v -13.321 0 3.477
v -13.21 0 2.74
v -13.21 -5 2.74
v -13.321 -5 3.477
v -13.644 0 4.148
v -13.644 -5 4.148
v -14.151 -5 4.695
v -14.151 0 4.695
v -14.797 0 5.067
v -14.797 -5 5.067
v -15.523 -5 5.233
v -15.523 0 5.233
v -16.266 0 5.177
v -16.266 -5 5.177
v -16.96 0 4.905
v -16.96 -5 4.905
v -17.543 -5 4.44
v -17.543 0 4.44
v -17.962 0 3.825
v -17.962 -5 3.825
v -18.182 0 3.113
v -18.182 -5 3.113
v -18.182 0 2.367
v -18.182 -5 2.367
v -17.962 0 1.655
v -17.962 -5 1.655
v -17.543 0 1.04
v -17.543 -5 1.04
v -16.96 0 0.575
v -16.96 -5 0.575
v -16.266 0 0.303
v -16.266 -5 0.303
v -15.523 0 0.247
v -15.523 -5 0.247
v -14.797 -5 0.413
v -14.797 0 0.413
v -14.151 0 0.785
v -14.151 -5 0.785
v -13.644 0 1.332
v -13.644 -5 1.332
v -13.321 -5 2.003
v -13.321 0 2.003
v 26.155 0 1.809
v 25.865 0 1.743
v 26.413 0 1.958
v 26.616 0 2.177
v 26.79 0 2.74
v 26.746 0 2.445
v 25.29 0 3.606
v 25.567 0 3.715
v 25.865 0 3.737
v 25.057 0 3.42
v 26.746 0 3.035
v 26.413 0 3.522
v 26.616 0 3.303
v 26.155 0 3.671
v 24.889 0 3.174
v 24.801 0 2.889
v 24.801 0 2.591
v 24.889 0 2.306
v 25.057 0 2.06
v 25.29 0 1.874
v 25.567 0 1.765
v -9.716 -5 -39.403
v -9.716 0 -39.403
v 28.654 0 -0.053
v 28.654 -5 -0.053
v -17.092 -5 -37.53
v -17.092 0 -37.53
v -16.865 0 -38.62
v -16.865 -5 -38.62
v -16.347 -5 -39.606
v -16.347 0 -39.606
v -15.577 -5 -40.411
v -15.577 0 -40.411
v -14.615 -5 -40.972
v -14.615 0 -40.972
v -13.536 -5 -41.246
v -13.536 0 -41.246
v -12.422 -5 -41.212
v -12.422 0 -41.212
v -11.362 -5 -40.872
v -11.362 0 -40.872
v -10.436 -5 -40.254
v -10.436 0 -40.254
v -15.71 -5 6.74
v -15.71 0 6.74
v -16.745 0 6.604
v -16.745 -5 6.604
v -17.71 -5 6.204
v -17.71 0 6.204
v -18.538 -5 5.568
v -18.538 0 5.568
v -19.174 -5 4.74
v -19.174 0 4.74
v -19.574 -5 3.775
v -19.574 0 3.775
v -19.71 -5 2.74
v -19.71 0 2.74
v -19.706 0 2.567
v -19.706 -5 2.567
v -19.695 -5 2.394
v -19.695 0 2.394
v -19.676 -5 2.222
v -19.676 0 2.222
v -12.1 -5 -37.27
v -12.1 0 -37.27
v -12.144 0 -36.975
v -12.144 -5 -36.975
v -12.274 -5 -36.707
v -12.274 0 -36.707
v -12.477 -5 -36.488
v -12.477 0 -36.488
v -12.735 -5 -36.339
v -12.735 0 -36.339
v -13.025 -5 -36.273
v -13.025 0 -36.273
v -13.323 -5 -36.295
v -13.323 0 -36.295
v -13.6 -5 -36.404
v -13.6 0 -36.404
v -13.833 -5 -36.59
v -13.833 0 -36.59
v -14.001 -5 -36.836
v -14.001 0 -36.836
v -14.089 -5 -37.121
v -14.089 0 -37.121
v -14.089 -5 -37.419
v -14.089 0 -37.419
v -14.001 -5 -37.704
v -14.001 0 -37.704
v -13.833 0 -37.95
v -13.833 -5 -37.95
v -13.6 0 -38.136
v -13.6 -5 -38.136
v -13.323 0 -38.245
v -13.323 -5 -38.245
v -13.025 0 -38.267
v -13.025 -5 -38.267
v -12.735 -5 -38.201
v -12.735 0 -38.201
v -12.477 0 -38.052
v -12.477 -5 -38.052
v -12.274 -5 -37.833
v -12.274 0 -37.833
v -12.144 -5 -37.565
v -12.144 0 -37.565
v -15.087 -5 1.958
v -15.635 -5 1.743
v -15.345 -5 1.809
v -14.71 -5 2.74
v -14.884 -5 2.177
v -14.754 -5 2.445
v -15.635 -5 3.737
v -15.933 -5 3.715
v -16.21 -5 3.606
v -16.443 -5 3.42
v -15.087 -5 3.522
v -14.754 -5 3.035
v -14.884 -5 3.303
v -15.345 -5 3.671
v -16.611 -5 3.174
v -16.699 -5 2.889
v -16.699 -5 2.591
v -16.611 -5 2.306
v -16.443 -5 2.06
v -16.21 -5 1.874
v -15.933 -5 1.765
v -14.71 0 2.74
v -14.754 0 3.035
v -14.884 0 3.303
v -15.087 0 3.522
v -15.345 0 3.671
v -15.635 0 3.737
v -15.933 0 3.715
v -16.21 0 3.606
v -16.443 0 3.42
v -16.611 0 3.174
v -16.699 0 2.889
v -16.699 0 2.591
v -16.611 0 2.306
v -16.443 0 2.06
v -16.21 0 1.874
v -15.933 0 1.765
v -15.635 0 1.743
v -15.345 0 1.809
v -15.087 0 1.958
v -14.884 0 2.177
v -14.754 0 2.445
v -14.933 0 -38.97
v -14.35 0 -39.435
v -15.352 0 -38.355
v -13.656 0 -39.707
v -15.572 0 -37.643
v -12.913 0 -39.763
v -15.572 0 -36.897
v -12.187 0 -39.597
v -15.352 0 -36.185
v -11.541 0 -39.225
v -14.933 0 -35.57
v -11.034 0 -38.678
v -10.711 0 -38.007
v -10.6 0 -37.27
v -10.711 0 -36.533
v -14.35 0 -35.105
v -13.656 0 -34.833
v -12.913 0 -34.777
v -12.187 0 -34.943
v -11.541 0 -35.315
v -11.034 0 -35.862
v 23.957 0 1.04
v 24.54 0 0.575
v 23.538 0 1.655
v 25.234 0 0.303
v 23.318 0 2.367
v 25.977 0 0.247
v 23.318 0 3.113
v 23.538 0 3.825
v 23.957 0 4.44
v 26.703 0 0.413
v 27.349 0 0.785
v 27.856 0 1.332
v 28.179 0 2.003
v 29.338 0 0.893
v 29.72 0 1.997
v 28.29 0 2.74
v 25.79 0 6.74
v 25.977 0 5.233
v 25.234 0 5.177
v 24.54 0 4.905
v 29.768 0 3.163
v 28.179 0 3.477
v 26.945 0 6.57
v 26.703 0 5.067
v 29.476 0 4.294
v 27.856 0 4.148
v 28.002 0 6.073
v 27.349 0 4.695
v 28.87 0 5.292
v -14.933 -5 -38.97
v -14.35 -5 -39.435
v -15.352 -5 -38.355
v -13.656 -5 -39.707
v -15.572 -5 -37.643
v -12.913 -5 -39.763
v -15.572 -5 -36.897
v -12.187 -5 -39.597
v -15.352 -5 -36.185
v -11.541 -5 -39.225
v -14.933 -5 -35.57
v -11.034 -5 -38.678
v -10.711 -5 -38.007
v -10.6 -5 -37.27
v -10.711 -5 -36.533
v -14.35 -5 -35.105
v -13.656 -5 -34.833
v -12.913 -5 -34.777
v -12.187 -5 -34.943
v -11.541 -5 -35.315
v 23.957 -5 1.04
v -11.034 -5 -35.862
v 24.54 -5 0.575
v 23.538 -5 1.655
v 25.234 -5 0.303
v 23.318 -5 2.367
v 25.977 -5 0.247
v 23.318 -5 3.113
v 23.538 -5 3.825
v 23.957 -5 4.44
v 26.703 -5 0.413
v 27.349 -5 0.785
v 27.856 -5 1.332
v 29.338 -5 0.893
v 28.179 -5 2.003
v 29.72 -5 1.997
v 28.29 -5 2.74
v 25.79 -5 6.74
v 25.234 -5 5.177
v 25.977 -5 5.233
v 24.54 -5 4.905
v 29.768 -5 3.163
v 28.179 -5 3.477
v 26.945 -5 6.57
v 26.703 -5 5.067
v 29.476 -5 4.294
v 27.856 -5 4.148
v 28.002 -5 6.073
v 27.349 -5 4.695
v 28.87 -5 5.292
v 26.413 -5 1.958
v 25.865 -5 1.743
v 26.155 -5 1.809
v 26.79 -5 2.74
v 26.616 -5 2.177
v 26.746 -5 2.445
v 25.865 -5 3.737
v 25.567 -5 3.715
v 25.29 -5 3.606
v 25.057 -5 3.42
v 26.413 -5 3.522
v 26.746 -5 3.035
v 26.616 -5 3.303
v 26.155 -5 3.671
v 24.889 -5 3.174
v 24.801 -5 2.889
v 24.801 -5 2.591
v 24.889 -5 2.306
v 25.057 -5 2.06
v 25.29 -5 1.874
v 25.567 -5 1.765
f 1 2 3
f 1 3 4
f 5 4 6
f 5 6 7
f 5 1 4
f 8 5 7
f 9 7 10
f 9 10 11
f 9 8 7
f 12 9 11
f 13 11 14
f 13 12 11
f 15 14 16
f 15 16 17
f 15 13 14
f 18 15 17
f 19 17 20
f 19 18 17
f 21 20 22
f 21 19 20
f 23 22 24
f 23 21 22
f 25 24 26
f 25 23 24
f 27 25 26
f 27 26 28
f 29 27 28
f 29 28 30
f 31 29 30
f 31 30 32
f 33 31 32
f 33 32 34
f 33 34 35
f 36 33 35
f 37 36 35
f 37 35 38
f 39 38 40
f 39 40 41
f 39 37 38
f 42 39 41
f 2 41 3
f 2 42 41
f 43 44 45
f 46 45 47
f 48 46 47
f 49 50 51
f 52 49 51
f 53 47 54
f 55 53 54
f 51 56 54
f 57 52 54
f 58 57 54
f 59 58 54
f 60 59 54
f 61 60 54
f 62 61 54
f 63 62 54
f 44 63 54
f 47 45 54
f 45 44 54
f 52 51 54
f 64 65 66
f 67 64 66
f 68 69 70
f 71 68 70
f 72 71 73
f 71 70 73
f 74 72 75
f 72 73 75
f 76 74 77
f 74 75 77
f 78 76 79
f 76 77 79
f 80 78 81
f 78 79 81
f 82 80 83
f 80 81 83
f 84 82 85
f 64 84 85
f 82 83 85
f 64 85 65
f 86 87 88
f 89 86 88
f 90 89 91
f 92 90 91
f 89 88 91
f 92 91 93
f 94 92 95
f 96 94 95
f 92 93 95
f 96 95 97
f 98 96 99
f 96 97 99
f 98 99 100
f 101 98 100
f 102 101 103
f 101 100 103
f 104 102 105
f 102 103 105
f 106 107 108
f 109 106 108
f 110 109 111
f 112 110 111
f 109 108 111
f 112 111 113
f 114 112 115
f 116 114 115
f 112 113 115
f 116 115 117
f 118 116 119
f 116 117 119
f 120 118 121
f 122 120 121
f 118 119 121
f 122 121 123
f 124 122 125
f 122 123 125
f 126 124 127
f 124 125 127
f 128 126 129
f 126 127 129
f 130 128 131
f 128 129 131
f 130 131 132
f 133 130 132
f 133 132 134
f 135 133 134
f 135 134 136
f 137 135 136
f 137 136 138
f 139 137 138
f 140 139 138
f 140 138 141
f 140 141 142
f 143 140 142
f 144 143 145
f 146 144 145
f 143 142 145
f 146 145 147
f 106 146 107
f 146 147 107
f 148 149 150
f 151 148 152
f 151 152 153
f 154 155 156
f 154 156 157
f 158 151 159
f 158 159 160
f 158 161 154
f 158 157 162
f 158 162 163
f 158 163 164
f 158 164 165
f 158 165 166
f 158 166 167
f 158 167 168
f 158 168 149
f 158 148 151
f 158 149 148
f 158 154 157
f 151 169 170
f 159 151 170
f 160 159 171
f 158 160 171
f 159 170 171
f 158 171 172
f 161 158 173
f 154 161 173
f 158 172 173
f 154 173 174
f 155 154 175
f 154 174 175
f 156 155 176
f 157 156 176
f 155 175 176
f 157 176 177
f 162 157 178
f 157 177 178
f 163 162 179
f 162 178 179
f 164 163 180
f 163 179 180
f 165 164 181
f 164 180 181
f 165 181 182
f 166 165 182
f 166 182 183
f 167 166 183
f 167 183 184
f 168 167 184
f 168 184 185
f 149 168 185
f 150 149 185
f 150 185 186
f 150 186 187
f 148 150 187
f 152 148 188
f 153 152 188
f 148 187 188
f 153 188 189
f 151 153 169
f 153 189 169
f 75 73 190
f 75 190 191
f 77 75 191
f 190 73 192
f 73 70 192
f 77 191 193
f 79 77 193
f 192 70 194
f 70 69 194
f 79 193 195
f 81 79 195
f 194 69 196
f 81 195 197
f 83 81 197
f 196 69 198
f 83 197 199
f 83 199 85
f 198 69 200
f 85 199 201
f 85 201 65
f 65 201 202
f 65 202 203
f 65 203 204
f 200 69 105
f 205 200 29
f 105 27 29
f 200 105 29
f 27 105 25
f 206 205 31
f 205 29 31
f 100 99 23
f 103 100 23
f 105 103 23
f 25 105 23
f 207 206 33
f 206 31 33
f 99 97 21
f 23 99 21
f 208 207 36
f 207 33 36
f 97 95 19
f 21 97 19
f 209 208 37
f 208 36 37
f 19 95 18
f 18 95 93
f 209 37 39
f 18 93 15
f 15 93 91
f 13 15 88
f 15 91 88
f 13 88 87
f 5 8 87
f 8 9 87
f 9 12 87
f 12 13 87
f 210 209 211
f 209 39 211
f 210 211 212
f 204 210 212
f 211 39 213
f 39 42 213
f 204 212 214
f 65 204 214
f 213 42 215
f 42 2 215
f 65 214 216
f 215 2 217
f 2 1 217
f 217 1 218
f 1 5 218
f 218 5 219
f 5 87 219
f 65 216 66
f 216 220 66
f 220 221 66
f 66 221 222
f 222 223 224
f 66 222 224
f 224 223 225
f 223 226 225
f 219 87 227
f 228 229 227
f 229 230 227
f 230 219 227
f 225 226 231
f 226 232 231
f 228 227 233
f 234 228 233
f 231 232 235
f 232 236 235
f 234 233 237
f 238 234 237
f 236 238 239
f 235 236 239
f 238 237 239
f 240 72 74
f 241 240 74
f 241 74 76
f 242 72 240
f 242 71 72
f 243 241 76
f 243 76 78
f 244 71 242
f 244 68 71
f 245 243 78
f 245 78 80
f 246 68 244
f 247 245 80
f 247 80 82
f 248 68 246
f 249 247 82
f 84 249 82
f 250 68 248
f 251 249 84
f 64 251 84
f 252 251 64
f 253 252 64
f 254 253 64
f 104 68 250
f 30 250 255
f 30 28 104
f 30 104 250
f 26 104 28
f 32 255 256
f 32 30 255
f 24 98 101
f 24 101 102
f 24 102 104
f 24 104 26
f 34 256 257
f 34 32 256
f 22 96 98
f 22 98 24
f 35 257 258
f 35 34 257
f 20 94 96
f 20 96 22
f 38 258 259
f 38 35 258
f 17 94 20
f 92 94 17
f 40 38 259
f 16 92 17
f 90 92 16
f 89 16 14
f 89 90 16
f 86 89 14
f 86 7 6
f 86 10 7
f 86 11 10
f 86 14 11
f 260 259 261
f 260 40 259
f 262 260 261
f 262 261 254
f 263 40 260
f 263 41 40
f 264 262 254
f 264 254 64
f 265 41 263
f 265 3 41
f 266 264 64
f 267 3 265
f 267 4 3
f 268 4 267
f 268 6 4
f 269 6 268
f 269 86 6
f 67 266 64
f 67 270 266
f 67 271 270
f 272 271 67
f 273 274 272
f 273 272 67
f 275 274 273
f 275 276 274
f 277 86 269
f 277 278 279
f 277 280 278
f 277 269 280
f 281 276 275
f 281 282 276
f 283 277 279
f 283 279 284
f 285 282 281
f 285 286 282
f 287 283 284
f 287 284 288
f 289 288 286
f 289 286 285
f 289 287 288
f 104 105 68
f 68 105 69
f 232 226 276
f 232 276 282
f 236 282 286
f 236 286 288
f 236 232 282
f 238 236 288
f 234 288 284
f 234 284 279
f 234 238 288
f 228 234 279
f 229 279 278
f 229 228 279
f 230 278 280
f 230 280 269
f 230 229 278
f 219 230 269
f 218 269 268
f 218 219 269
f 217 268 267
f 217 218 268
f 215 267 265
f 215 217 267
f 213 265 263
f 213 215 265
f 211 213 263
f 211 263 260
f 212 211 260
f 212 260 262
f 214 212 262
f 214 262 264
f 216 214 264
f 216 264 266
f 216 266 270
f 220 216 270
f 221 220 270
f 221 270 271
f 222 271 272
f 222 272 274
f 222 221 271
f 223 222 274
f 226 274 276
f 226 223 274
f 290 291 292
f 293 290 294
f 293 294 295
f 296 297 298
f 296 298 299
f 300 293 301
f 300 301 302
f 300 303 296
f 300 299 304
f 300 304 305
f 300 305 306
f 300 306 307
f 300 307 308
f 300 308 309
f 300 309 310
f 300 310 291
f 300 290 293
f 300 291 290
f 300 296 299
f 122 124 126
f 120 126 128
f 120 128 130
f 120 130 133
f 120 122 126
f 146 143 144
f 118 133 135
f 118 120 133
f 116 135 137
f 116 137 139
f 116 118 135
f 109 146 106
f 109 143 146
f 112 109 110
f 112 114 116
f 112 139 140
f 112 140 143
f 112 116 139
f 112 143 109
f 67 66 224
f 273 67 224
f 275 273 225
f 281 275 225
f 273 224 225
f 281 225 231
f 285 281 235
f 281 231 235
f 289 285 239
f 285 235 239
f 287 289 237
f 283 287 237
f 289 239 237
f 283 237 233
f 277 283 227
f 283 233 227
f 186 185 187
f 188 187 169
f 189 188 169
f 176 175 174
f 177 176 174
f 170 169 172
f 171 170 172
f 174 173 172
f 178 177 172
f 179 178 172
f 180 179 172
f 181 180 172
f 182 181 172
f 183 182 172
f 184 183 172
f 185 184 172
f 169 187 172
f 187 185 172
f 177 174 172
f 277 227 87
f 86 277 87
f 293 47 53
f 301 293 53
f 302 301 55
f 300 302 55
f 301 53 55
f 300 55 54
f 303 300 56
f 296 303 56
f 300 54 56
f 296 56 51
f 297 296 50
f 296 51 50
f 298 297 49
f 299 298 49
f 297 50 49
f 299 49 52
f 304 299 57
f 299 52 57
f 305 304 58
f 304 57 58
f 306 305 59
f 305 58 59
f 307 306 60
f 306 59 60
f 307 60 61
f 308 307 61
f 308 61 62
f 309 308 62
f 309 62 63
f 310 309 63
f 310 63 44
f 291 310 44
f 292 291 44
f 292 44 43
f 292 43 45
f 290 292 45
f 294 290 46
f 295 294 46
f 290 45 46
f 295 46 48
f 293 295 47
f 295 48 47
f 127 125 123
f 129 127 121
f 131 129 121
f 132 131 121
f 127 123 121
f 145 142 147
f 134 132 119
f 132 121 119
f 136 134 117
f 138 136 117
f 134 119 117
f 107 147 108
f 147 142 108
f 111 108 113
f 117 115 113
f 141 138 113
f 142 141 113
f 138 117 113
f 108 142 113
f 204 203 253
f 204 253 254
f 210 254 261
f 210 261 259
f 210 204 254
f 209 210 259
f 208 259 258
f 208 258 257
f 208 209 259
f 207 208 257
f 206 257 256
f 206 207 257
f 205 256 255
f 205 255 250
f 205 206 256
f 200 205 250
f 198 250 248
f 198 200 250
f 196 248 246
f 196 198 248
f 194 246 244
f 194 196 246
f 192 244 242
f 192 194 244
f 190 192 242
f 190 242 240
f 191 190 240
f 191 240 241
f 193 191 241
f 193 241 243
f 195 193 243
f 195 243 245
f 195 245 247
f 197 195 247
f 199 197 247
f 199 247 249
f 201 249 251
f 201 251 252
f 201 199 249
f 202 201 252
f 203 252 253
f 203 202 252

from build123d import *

# Parameters (mm, degrees)
F0_R     = 2.5
F0_R_2   = 1
F1_DEPTH = 5


with BuildPart() as f1:
    # F0 (on Front) → F1 (new body)
    with BuildSketch(Plane.XZ):
        with BuildLine():
            Line((-9.716306, -39.403216), (28.653882, -0.052522))
            ThreePointArc((28.653882, -0.052522), (29.47579, 4.294013), (25.79, 6.74))
            Line((25.79, 6.74), (-15.71, 6.74))
            ThreePointArc((-15.71, 6.74), (-18.538427, 5.568427), (-19.71, 2.74))
            Line((-19.71, 2.74), (-19.676319, 2.222009))
            Line((-19.676319, 2.222009), (-17.091571, -37.529542))
            ThreePointArc((-17.091571, -37.529542), (-14.084907, -41.146849), (-9.716306, -39.403216))
        make_face()
        with Locations((-13.1, -37.27)):
            Circle(F0_R, mode=Mode.SUBTRACT)
        with Locations((-15.71, 2.74)):
            Circle(F0_R, mode=Mode.SUBTRACT)
        with Locations((25.79, 2.74)):
            Circle(F0_R, mode=Mode.SUBTRACT)
        with BuildLine():
            Line((-19.676319, 2.222009), (-19.71, 2.74))
            ThreePointArc((-19.71, 2.74), (-19.701571, 2.480458), (-19.676319, 2.222009))
        make_face()
        with Locations((-15.71, 2.74)):
            Circle(F0_R_2)
        with Locations((25.79, 2.74)):
            Circle(F0_R_2)
        with Locations((-13.1, -37.27)):
            Circle(F0_R_2)
    extrude(amount=F1_DEPTH)


solid = f1.part
